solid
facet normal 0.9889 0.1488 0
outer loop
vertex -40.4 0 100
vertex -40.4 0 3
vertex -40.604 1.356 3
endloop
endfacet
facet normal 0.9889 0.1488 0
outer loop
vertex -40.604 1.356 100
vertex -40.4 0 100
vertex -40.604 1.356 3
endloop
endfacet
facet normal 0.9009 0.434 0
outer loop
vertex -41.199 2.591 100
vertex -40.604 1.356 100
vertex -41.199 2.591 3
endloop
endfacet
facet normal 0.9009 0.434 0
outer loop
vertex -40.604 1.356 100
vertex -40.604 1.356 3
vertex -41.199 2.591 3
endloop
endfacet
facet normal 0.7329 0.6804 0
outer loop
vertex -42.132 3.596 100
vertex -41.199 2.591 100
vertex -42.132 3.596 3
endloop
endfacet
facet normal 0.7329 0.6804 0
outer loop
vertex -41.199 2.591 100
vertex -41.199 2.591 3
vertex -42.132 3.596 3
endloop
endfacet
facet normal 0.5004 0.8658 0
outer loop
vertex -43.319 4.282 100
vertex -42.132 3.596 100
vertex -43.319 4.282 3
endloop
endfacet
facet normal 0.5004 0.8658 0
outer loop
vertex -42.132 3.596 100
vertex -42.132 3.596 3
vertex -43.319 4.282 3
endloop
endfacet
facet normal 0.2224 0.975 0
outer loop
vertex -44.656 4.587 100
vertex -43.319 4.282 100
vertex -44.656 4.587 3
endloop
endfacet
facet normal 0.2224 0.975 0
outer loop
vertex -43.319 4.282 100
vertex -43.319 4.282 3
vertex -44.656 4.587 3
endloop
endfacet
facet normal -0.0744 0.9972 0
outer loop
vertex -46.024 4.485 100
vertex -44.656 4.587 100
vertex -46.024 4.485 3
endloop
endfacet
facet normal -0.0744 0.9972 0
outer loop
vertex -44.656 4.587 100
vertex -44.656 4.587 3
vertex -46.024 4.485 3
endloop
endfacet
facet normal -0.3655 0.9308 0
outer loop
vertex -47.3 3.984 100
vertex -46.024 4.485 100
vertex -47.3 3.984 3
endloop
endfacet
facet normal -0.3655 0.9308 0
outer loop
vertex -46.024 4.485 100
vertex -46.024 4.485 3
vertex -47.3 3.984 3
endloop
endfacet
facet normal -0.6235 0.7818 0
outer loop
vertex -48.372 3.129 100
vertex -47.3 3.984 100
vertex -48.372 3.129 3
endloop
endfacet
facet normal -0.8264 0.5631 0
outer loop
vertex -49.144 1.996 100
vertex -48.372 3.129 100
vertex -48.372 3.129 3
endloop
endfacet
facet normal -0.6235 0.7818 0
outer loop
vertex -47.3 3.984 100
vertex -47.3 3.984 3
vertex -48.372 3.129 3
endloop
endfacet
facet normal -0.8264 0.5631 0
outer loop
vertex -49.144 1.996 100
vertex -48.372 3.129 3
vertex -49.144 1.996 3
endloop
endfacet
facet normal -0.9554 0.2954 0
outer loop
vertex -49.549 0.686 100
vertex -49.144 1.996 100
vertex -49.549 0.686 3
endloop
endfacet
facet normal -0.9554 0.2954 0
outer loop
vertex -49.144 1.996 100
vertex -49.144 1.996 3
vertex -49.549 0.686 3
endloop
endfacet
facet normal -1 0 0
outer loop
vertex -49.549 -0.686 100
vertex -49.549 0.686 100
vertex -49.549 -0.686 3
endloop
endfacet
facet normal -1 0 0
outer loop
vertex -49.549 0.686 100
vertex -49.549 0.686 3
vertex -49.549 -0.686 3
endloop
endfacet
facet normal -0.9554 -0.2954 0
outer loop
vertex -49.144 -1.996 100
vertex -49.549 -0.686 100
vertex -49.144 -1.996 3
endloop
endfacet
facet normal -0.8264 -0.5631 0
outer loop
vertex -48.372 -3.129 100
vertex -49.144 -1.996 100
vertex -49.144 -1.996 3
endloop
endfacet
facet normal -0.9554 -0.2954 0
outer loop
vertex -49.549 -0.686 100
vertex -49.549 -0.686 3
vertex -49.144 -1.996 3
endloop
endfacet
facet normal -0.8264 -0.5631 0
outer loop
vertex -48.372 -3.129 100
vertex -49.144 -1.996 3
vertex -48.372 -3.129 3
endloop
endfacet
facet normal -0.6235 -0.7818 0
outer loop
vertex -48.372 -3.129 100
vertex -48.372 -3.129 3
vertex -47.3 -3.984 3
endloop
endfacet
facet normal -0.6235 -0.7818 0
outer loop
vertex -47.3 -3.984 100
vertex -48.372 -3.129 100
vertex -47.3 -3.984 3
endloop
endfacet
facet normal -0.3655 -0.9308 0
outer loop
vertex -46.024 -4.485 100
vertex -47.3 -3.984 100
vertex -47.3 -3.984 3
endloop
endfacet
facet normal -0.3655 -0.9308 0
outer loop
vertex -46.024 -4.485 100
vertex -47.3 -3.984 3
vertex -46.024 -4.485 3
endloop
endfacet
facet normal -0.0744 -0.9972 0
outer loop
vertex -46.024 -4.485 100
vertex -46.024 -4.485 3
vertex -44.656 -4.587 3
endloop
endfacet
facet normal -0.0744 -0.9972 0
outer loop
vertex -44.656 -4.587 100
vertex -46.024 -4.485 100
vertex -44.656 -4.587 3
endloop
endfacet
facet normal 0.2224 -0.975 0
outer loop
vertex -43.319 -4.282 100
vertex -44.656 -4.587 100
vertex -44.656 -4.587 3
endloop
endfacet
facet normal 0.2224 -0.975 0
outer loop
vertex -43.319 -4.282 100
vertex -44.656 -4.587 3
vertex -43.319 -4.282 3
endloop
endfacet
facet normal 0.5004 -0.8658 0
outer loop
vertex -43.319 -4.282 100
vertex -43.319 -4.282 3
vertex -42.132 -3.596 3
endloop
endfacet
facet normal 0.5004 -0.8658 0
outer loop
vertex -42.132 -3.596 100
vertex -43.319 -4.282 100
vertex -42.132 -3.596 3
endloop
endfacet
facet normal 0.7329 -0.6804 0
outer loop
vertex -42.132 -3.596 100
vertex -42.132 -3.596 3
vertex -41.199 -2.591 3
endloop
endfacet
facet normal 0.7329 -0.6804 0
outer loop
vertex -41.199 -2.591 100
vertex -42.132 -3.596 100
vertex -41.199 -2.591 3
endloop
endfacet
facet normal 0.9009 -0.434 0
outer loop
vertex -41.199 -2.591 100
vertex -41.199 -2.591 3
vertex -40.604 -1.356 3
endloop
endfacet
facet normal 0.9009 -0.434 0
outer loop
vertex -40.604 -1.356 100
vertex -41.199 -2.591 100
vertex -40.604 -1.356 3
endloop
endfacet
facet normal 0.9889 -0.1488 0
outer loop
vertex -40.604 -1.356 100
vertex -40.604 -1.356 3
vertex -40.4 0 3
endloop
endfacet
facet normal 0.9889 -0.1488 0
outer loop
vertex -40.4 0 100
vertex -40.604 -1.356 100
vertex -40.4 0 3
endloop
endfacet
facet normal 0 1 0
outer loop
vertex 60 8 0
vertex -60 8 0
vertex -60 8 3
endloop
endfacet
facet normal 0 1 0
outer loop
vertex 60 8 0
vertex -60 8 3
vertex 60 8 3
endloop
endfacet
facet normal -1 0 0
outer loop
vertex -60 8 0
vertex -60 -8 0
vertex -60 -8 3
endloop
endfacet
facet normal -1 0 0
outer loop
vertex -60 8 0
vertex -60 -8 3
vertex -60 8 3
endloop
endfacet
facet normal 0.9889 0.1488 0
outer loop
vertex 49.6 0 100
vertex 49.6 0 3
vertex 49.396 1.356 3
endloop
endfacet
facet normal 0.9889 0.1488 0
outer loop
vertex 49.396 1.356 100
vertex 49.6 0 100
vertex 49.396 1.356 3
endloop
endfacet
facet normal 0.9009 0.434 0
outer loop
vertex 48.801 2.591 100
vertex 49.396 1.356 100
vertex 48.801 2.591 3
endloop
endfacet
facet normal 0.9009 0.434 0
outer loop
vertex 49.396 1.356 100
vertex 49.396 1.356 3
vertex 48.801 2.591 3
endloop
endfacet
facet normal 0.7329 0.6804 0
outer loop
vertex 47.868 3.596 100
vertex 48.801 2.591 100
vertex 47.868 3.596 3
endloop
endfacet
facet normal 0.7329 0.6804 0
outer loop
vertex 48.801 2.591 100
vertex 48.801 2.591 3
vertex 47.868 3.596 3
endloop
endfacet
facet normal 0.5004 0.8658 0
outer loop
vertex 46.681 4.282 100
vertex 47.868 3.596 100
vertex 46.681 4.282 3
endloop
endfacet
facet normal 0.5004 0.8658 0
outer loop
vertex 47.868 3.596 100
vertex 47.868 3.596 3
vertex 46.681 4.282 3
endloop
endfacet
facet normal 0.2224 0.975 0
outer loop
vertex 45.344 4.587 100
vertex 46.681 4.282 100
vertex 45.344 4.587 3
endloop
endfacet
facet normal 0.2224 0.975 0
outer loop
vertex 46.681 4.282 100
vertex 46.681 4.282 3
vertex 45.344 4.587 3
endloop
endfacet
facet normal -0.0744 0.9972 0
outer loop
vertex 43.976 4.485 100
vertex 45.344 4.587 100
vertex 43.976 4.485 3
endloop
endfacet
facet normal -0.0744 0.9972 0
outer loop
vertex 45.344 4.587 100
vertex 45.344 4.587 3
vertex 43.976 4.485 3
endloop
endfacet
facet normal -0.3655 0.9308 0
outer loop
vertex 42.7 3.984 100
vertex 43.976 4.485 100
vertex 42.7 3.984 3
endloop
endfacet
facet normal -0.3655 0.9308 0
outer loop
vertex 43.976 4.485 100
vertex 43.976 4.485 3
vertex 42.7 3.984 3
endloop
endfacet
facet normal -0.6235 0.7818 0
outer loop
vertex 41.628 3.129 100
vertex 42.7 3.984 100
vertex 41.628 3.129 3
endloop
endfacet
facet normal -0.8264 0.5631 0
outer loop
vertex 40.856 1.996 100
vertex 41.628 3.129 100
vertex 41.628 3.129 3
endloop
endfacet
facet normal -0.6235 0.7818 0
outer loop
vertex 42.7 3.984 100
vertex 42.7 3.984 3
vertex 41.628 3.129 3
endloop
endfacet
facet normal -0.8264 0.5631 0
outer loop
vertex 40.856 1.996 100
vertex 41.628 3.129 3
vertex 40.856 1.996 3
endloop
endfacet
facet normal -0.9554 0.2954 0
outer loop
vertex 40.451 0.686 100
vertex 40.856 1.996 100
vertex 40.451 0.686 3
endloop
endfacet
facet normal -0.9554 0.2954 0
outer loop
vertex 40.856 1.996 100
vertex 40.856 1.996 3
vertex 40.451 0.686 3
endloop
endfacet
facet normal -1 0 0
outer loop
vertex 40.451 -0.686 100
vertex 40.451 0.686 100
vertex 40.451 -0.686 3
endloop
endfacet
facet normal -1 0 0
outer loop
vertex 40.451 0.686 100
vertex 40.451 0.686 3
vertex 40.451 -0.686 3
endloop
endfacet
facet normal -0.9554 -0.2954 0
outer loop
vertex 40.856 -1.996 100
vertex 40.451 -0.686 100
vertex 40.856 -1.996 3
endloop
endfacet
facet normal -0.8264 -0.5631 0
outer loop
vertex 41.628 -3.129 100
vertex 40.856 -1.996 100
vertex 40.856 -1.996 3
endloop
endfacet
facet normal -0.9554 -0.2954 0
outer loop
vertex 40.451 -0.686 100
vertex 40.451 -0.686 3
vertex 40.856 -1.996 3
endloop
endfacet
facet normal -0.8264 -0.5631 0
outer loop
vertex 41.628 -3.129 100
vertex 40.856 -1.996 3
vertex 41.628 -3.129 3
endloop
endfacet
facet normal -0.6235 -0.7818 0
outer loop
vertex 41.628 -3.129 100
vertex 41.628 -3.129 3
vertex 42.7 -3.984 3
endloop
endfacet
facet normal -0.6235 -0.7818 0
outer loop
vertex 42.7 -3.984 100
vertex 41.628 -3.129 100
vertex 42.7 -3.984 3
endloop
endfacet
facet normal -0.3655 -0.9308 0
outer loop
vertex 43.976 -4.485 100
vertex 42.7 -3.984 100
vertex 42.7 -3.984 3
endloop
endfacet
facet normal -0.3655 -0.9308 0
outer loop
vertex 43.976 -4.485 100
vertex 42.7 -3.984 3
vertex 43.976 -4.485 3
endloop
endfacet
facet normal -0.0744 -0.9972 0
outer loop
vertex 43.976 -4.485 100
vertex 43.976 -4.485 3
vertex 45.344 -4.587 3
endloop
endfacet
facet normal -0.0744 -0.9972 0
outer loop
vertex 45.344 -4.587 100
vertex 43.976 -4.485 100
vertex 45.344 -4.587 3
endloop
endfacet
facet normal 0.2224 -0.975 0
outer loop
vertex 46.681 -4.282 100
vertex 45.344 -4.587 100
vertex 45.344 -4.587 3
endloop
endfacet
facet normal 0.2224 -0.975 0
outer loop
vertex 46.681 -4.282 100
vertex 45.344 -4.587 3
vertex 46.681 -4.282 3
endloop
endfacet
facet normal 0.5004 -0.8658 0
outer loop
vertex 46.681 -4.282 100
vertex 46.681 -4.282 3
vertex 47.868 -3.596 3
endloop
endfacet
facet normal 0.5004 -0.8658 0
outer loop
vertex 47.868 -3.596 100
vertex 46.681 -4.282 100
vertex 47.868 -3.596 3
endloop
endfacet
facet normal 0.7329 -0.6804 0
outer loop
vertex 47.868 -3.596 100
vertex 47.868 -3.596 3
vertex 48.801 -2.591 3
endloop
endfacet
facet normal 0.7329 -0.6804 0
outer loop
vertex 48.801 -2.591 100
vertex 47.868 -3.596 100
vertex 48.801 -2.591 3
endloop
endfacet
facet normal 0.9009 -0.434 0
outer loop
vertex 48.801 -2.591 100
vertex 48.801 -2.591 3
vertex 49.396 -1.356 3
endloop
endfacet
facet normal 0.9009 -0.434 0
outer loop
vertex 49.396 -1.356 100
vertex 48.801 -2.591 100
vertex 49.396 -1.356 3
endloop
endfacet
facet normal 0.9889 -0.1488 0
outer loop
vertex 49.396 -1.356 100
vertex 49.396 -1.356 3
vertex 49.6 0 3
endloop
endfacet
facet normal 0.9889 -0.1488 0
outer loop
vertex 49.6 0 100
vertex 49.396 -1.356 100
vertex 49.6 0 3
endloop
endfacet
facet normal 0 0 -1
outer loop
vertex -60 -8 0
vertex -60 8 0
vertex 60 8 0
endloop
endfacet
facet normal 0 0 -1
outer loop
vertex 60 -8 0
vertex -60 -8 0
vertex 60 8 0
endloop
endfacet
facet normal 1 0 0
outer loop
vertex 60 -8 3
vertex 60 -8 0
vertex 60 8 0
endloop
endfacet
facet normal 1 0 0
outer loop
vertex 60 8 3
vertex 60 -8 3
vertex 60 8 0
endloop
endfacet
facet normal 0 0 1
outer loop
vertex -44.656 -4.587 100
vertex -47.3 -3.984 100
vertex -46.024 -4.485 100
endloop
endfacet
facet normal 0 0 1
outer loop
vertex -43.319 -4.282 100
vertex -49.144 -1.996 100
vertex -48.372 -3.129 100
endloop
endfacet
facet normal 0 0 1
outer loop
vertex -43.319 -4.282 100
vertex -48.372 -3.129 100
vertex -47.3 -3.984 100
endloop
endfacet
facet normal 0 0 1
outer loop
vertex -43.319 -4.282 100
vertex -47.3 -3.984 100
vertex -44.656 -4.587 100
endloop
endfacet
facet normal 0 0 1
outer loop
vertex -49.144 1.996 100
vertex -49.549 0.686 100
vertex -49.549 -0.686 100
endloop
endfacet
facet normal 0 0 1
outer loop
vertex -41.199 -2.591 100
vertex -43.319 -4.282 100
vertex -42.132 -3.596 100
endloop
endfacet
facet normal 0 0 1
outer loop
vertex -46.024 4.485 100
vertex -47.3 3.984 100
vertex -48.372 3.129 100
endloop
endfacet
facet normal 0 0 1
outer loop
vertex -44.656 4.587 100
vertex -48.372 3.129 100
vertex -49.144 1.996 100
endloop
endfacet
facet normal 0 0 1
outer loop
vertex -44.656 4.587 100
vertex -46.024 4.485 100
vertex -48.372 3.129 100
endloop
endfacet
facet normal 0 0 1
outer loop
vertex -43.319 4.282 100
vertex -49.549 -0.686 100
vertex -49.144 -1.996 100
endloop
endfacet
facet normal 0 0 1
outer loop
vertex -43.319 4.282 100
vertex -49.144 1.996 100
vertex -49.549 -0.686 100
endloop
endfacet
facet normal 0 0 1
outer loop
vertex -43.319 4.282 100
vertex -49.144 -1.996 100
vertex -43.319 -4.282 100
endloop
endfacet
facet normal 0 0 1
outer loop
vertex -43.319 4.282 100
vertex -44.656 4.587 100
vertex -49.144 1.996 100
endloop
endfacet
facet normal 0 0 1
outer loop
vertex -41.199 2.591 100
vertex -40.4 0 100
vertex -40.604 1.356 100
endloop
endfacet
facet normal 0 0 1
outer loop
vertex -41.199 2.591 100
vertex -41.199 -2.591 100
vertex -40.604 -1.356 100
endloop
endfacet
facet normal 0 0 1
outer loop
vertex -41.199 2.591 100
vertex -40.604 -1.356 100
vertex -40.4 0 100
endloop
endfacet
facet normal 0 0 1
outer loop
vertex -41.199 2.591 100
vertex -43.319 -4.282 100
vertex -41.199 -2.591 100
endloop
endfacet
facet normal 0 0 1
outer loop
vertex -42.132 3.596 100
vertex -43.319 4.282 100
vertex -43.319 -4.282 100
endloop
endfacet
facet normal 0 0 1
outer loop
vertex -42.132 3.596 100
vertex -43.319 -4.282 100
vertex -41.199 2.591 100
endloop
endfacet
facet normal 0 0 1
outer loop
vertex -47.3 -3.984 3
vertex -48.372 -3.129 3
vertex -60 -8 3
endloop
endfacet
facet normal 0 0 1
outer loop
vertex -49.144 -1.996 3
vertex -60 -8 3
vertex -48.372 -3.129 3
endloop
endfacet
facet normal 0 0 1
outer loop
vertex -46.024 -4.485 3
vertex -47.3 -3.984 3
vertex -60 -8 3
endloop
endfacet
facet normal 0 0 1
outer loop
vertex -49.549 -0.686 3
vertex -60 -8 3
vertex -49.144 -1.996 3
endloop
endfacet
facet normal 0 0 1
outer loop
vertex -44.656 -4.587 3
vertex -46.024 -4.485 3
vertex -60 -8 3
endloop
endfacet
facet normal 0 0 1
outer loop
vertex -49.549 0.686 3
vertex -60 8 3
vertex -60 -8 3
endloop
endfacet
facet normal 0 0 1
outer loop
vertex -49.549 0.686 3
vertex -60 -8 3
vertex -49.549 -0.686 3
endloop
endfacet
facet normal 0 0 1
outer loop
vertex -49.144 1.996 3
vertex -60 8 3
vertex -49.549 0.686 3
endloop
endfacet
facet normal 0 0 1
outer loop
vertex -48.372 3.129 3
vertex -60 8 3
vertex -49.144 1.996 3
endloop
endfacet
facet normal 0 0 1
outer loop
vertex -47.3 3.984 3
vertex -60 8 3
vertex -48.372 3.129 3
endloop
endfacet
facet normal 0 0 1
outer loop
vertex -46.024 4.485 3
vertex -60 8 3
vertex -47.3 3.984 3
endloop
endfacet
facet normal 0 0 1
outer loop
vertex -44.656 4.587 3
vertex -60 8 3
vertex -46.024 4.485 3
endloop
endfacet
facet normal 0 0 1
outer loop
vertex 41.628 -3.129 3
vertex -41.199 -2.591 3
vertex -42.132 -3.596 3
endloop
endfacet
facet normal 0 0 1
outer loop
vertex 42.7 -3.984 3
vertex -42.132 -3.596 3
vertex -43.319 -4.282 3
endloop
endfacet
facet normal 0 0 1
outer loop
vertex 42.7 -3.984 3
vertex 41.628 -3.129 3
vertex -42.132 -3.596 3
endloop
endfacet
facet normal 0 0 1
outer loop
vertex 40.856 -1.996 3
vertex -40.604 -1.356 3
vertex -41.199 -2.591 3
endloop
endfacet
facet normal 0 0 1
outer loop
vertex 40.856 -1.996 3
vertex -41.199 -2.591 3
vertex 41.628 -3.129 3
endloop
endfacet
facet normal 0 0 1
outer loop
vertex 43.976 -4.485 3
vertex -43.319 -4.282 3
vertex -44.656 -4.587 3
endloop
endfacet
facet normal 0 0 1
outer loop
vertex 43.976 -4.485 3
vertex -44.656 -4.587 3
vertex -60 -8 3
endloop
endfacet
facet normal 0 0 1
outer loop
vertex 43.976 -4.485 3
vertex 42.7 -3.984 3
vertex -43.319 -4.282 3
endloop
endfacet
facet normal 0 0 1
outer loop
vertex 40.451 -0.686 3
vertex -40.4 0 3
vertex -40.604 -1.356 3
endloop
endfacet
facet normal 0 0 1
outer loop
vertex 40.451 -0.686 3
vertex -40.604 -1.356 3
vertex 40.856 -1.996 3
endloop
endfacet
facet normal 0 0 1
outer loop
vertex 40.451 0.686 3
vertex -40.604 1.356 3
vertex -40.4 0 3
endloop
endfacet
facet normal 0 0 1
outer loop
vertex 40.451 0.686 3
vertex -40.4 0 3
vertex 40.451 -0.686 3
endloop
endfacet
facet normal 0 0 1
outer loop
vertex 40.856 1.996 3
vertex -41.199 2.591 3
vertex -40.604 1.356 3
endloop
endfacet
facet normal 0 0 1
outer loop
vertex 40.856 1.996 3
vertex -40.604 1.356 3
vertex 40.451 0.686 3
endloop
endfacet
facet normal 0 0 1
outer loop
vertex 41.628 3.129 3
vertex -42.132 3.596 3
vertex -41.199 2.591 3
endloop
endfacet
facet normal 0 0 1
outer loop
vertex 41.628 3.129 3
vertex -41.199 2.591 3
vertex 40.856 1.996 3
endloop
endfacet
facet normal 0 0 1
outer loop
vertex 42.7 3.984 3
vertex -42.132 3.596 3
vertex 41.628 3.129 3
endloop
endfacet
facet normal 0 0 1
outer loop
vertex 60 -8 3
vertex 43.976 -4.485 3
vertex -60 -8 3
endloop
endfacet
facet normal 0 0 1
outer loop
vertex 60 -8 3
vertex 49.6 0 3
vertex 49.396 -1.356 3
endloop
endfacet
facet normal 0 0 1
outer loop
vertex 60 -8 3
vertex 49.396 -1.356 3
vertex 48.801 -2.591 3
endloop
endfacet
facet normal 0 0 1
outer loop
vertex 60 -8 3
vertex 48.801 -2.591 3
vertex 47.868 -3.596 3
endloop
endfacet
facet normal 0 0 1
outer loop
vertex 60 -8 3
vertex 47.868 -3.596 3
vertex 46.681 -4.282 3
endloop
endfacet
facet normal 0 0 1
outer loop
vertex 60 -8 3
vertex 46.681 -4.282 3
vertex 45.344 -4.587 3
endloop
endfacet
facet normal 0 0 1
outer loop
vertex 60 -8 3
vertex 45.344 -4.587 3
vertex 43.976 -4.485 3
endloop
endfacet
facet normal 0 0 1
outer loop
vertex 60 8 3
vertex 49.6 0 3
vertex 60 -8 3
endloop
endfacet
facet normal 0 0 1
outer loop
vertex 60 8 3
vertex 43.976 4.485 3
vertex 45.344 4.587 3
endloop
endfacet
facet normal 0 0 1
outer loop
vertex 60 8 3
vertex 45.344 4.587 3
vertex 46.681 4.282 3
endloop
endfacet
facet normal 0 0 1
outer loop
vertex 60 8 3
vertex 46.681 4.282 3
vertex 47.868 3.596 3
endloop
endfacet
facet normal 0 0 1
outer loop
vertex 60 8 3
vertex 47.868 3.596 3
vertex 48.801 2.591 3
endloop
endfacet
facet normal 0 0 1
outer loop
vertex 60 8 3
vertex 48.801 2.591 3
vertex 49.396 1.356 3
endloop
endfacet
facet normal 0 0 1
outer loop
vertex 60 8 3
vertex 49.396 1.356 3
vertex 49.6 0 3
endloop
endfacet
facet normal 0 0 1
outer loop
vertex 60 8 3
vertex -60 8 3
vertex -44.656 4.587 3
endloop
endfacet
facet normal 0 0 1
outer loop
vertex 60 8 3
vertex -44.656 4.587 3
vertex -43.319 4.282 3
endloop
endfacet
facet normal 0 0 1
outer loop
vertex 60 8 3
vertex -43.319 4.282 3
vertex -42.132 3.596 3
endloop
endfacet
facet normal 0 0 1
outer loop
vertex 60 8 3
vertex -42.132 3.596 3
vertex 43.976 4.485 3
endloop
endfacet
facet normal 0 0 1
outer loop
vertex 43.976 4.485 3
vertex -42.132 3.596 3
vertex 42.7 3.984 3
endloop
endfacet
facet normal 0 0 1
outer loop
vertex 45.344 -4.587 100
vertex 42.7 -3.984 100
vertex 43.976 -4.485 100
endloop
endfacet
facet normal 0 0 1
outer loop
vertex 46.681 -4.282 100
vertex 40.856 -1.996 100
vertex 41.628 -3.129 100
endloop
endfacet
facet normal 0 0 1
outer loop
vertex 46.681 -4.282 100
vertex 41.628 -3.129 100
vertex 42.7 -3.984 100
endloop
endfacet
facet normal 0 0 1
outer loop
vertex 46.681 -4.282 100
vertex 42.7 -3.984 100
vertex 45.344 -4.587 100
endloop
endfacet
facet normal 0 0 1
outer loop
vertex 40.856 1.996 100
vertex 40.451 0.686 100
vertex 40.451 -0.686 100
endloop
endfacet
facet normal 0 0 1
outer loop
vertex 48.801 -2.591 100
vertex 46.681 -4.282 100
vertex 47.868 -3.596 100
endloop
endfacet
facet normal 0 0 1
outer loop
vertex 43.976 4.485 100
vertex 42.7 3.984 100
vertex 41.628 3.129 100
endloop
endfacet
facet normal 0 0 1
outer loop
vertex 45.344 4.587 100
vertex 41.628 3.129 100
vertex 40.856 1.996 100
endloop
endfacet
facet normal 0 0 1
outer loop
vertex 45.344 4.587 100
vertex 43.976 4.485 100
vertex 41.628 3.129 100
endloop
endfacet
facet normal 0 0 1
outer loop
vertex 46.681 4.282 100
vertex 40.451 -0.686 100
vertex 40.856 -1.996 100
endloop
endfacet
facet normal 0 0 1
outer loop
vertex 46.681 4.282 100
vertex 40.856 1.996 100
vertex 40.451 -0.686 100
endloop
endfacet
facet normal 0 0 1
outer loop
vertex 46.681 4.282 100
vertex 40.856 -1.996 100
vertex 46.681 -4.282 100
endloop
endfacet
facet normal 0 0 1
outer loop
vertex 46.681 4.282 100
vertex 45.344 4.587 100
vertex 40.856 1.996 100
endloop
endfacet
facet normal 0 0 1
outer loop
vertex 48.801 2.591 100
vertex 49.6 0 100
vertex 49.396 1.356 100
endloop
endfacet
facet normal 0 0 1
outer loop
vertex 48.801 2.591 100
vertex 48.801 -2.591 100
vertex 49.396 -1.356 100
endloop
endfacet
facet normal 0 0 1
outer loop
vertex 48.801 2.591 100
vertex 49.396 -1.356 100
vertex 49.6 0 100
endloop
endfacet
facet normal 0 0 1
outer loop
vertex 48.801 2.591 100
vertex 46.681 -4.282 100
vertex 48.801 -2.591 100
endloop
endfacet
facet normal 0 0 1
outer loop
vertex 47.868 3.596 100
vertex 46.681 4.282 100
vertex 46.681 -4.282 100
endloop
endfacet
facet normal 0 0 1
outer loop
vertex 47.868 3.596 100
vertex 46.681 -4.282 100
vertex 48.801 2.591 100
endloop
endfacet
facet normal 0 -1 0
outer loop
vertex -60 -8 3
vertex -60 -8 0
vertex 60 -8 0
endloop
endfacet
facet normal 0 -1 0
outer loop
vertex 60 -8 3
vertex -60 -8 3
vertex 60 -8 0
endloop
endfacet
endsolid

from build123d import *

# Parameters (mm, degrees)
F0_W     = 120
F0_H     = 16
F1_DEPTH = 3
F2_R     = 4.6
F3_DEPTH = 100


with BuildPart() as f1:
    # F0 (on Top) → F1 (new body)
    with BuildSketch(Plane.XY):
        Rectangle(F0_W, F0_H)
    extrude(amount=F1_DEPTH)

    # F2 (on Top) → F3 (join)
    with BuildSketch(Plane.XY):
        with Locations((-45, 0)):
            Circle(F2_R)
        with Locations((45, 0)):
            Circle(F2_R)
    extrude(amount=F3_DEPTH)


solid = f1.part
